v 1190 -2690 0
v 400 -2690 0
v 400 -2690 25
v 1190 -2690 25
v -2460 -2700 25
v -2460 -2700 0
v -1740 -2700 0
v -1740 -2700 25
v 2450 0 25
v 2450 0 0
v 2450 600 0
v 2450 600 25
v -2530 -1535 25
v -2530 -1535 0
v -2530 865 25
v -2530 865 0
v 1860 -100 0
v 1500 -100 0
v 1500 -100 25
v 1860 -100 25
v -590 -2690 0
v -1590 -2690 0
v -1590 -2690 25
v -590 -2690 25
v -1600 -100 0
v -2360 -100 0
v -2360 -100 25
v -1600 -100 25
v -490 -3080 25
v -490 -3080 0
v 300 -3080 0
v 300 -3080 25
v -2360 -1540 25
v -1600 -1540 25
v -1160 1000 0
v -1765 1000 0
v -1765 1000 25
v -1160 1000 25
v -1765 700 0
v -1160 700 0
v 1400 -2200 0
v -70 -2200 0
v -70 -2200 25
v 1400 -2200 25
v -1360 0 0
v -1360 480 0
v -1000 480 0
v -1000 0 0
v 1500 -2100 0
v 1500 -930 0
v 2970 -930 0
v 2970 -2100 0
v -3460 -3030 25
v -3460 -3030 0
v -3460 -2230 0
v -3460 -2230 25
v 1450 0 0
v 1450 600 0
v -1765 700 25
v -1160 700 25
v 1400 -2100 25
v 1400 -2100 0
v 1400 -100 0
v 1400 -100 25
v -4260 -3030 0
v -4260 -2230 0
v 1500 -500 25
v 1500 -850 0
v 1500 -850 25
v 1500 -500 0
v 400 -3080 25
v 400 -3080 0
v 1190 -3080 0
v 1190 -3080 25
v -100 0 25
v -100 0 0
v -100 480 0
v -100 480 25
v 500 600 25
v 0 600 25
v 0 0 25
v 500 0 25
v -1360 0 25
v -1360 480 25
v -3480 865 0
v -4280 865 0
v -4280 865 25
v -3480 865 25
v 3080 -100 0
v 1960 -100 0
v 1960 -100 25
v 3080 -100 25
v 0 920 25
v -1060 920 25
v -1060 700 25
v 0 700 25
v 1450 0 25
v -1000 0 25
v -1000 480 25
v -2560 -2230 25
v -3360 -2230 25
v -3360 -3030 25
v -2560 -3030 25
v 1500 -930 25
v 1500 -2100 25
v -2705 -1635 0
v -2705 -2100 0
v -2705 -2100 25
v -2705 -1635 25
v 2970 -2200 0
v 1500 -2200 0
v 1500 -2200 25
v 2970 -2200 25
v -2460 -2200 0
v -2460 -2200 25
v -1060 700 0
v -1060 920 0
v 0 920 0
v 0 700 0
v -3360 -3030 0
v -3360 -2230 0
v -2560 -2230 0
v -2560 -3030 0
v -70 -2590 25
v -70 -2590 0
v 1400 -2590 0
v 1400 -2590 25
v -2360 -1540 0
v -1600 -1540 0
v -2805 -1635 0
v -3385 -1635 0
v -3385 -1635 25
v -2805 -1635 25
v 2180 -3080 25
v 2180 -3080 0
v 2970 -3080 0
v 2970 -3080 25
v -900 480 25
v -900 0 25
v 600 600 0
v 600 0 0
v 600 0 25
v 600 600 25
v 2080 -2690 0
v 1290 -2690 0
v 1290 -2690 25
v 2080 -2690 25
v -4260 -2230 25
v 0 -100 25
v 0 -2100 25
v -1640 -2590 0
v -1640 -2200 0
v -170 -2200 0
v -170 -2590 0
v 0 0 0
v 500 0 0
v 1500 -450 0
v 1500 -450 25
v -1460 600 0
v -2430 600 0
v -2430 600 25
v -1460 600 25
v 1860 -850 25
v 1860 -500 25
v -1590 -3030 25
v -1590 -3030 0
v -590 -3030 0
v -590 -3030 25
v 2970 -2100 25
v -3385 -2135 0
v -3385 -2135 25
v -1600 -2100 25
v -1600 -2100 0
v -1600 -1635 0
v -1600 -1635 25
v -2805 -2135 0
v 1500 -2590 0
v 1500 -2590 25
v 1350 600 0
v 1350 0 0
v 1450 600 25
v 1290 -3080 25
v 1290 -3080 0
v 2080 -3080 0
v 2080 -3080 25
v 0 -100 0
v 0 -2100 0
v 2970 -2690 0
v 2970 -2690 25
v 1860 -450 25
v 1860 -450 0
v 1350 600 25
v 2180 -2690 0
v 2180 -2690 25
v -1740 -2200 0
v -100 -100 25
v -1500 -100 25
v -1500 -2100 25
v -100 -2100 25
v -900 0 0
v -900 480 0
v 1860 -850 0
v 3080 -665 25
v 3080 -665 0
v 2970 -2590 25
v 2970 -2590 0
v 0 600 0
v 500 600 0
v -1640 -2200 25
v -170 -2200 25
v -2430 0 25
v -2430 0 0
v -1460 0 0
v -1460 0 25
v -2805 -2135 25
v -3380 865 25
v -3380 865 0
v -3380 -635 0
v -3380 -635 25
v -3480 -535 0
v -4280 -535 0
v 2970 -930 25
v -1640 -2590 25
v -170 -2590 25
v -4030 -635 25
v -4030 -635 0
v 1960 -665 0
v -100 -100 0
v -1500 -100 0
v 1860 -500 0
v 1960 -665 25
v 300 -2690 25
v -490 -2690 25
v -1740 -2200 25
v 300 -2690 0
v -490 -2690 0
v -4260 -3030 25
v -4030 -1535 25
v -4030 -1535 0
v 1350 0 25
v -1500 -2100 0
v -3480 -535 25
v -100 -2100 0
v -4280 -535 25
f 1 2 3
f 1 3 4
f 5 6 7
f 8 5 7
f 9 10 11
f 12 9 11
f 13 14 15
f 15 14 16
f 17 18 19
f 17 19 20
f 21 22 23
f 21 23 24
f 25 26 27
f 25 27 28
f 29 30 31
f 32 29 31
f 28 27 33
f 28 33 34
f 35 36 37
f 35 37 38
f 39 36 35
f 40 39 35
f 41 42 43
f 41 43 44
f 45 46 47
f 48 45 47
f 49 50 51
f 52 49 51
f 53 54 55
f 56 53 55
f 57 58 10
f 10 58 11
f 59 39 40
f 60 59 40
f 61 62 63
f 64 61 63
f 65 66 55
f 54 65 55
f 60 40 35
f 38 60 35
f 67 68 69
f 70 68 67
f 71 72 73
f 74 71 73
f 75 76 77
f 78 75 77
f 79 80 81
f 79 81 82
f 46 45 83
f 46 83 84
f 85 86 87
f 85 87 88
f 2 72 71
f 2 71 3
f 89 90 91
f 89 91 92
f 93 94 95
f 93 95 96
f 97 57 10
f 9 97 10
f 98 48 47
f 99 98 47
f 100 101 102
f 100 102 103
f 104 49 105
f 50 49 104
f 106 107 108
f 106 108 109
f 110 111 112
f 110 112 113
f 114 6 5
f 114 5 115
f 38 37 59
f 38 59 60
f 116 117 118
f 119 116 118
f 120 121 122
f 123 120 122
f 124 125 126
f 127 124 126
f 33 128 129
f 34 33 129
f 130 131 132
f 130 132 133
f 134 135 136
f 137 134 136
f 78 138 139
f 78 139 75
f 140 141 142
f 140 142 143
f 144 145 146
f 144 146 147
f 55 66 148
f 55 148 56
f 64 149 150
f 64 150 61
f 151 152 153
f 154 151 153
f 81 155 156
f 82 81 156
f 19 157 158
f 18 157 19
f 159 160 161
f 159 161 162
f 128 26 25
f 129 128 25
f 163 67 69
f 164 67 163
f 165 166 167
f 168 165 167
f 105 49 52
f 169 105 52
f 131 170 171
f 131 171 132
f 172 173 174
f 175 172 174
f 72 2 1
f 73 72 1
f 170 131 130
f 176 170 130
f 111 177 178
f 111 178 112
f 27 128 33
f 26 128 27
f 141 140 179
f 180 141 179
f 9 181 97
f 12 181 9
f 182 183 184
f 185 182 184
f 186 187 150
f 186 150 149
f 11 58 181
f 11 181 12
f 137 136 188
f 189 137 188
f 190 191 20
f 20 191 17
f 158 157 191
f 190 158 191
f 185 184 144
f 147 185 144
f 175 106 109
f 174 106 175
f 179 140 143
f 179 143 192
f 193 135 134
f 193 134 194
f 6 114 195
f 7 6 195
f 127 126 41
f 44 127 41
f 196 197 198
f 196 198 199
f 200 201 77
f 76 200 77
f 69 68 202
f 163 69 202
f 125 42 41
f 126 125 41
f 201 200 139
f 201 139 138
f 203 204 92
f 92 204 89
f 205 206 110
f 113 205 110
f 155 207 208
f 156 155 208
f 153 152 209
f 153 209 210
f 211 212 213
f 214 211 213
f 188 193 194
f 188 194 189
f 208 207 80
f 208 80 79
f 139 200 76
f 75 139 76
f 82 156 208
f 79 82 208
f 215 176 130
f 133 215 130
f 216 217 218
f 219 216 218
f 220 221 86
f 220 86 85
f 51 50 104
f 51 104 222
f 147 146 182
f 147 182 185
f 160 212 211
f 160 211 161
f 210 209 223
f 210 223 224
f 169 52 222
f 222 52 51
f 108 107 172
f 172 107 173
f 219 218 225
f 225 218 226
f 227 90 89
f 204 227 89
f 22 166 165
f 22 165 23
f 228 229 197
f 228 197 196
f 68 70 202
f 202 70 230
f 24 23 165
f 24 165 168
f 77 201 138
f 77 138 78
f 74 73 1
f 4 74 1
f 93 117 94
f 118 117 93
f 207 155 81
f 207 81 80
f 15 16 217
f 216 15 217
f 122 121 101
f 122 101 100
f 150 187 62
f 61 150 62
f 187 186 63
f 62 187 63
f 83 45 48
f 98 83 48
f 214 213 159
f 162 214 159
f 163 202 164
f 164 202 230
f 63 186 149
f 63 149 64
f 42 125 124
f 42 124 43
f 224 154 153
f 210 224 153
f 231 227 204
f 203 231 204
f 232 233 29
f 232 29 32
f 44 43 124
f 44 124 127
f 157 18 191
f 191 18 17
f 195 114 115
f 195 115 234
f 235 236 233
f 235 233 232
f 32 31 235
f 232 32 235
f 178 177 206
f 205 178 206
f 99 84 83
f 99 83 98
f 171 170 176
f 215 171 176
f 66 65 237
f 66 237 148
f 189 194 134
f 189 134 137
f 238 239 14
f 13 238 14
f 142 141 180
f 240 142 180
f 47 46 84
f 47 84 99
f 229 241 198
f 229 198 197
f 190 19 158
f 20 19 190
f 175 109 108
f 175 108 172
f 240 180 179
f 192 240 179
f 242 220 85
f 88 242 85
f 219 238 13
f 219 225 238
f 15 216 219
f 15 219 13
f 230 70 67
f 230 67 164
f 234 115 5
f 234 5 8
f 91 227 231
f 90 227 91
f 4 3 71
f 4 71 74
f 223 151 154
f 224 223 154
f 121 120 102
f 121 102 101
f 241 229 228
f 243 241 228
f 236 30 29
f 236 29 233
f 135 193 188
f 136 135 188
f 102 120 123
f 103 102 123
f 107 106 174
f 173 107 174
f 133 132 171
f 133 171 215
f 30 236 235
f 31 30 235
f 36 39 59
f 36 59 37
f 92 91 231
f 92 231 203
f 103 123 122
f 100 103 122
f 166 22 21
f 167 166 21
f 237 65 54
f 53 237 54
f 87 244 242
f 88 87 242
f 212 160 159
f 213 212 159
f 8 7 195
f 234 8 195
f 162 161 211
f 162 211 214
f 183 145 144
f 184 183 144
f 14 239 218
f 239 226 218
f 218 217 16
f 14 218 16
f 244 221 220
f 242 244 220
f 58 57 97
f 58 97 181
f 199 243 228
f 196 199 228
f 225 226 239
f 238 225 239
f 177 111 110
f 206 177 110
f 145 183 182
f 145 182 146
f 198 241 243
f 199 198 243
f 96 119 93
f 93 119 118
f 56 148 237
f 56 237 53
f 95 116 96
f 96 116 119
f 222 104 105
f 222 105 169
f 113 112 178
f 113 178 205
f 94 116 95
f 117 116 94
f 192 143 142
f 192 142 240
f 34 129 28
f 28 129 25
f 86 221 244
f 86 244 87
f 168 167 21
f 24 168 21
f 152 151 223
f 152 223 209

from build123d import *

# Parameters (mm, degrees)
F0_W     = 500
F0_H     = 600
F0_W_2   = 750
F0_W_3   = 1000
F0_W_4   = 1400
F0_H_2   = 2000
F0_W_5   = 360
F0_H_3   = 350
F0_W_6   = 1470
F0_H_4   = 1170
F0_W_7   = 800
F0_H_5   = 480
F0_W_8   = 970
F0_W_9   = 760
F0_H_6   = 1440
F0_W_10  = 1105
F0_H_7   = 465
F0_W_11  = 1060
F0_H_8   = 220
F0_W_12  = 605
F0_H_9   = 300
F0_W_13  = 1120
F0_H_10  = 565
F0_H_11  = 390
F0_W_14  = 790
F0_W_15  = 580
F0_H_12  = 500
F0_W_16  = 720
F0_H_13  = 340
F0_H_14  = 800
F0_H_15  = 1400
F1_DEPTH = 25


with BuildPart() as f1:
    # F0 (on Top) → F1 (new body)
    with BuildSketch(Plane.XY):
        with Locations((250, 300)):
            Rectangle(F0_W, F0_H)
        with Locations((975, 300)):
            Rectangle(F0_W_2, F0_H)
        with Locations((1950, 300)):
            Rectangle(F0_W_3, F0_H)
        with Locations((700, -1100)):
            Rectangle(F0_W_4, F0_H_2)
        with Locations((1680, -275)):
            Rectangle(F0_W_5, F0_H_3)
        with Locations((1680, -675)):
            Rectangle(F0_W_5, F0_H_3)
        with Locations((-800, -1100)):
            Rectangle(F0_W_4, F0_H_2)
        with Locations((2235, -1515)):
            Rectangle(F0_W_6, F0_H_4)
        with Locations((-500, 240)):
            Rectangle(F0_W_7, F0_H_5)
        with Locations((-1180, 240)):
            Rectangle(F0_W_5, F0_H_5)
        with Locations((-1945, 300)):
            Rectangle(F0_W_8, F0_H)
        with Locations((-1980, -820)):
            Rectangle(F0_W_9, F0_H_6)
        with Locations((-2152.5, -1867.5)):
            Rectangle(F0_W_10, F0_H_7)
        with Locations((-530, 810)):
            Rectangle(F0_W_11, F0_H_8)
        with Locations((-1462.5, 850)):
            Rectangle(F0_W_12, F0_H_9)
        with Locations((2520, -382.5)):
            Rectangle(F0_W_13, F0_H_10)
        Polygon((-4030, -1535), (-2530, -1535), (-2530, 865), (-3380, 865), (-3380, -635), (-4030, -635), align=None)
        with Locations((2235, -2395)):
            Rectangle(F0_W_6, F0_H_11)
        with Locations((665, -2395)):
            Rectangle(F0_W_6, F0_H_11)
        with Locations((-905, -2395)):
            Rectangle(F0_W_6, F0_H_11)
        with Locations((2575, -2885)):
            Rectangle(F0_W_14, F0_H_11)
        with Locations((1685, -2885)):
            Rectangle(F0_W_14, F0_H_11)
        with Locations((795, -2885)):
            Rectangle(F0_W_14, F0_H_11)
        with Locations((-95, -2885)):
            Rectangle(F0_W_14, F0_H_11)
        with Locations((-3095, -1885)):
            Rectangle(F0_W_15, F0_H_12)
        with Locations((-2100, -2450)):
            Rectangle(F0_W_16, F0_H_12)
        with Locations((-1090, -2860)):
            Rectangle(F0_W_3, F0_H_13)
        with Locations((-2960, -2630)):
            Rectangle(F0_W_7, F0_H_14)
        with Locations((-3860, -2630)):
            Rectangle(F0_W_7, F0_H_14)
        with Locations((-3880, 165)):
            Rectangle(F0_W_7, F0_H_15)
    extrude(amount=F1_DEPTH)


solid = f1.part
